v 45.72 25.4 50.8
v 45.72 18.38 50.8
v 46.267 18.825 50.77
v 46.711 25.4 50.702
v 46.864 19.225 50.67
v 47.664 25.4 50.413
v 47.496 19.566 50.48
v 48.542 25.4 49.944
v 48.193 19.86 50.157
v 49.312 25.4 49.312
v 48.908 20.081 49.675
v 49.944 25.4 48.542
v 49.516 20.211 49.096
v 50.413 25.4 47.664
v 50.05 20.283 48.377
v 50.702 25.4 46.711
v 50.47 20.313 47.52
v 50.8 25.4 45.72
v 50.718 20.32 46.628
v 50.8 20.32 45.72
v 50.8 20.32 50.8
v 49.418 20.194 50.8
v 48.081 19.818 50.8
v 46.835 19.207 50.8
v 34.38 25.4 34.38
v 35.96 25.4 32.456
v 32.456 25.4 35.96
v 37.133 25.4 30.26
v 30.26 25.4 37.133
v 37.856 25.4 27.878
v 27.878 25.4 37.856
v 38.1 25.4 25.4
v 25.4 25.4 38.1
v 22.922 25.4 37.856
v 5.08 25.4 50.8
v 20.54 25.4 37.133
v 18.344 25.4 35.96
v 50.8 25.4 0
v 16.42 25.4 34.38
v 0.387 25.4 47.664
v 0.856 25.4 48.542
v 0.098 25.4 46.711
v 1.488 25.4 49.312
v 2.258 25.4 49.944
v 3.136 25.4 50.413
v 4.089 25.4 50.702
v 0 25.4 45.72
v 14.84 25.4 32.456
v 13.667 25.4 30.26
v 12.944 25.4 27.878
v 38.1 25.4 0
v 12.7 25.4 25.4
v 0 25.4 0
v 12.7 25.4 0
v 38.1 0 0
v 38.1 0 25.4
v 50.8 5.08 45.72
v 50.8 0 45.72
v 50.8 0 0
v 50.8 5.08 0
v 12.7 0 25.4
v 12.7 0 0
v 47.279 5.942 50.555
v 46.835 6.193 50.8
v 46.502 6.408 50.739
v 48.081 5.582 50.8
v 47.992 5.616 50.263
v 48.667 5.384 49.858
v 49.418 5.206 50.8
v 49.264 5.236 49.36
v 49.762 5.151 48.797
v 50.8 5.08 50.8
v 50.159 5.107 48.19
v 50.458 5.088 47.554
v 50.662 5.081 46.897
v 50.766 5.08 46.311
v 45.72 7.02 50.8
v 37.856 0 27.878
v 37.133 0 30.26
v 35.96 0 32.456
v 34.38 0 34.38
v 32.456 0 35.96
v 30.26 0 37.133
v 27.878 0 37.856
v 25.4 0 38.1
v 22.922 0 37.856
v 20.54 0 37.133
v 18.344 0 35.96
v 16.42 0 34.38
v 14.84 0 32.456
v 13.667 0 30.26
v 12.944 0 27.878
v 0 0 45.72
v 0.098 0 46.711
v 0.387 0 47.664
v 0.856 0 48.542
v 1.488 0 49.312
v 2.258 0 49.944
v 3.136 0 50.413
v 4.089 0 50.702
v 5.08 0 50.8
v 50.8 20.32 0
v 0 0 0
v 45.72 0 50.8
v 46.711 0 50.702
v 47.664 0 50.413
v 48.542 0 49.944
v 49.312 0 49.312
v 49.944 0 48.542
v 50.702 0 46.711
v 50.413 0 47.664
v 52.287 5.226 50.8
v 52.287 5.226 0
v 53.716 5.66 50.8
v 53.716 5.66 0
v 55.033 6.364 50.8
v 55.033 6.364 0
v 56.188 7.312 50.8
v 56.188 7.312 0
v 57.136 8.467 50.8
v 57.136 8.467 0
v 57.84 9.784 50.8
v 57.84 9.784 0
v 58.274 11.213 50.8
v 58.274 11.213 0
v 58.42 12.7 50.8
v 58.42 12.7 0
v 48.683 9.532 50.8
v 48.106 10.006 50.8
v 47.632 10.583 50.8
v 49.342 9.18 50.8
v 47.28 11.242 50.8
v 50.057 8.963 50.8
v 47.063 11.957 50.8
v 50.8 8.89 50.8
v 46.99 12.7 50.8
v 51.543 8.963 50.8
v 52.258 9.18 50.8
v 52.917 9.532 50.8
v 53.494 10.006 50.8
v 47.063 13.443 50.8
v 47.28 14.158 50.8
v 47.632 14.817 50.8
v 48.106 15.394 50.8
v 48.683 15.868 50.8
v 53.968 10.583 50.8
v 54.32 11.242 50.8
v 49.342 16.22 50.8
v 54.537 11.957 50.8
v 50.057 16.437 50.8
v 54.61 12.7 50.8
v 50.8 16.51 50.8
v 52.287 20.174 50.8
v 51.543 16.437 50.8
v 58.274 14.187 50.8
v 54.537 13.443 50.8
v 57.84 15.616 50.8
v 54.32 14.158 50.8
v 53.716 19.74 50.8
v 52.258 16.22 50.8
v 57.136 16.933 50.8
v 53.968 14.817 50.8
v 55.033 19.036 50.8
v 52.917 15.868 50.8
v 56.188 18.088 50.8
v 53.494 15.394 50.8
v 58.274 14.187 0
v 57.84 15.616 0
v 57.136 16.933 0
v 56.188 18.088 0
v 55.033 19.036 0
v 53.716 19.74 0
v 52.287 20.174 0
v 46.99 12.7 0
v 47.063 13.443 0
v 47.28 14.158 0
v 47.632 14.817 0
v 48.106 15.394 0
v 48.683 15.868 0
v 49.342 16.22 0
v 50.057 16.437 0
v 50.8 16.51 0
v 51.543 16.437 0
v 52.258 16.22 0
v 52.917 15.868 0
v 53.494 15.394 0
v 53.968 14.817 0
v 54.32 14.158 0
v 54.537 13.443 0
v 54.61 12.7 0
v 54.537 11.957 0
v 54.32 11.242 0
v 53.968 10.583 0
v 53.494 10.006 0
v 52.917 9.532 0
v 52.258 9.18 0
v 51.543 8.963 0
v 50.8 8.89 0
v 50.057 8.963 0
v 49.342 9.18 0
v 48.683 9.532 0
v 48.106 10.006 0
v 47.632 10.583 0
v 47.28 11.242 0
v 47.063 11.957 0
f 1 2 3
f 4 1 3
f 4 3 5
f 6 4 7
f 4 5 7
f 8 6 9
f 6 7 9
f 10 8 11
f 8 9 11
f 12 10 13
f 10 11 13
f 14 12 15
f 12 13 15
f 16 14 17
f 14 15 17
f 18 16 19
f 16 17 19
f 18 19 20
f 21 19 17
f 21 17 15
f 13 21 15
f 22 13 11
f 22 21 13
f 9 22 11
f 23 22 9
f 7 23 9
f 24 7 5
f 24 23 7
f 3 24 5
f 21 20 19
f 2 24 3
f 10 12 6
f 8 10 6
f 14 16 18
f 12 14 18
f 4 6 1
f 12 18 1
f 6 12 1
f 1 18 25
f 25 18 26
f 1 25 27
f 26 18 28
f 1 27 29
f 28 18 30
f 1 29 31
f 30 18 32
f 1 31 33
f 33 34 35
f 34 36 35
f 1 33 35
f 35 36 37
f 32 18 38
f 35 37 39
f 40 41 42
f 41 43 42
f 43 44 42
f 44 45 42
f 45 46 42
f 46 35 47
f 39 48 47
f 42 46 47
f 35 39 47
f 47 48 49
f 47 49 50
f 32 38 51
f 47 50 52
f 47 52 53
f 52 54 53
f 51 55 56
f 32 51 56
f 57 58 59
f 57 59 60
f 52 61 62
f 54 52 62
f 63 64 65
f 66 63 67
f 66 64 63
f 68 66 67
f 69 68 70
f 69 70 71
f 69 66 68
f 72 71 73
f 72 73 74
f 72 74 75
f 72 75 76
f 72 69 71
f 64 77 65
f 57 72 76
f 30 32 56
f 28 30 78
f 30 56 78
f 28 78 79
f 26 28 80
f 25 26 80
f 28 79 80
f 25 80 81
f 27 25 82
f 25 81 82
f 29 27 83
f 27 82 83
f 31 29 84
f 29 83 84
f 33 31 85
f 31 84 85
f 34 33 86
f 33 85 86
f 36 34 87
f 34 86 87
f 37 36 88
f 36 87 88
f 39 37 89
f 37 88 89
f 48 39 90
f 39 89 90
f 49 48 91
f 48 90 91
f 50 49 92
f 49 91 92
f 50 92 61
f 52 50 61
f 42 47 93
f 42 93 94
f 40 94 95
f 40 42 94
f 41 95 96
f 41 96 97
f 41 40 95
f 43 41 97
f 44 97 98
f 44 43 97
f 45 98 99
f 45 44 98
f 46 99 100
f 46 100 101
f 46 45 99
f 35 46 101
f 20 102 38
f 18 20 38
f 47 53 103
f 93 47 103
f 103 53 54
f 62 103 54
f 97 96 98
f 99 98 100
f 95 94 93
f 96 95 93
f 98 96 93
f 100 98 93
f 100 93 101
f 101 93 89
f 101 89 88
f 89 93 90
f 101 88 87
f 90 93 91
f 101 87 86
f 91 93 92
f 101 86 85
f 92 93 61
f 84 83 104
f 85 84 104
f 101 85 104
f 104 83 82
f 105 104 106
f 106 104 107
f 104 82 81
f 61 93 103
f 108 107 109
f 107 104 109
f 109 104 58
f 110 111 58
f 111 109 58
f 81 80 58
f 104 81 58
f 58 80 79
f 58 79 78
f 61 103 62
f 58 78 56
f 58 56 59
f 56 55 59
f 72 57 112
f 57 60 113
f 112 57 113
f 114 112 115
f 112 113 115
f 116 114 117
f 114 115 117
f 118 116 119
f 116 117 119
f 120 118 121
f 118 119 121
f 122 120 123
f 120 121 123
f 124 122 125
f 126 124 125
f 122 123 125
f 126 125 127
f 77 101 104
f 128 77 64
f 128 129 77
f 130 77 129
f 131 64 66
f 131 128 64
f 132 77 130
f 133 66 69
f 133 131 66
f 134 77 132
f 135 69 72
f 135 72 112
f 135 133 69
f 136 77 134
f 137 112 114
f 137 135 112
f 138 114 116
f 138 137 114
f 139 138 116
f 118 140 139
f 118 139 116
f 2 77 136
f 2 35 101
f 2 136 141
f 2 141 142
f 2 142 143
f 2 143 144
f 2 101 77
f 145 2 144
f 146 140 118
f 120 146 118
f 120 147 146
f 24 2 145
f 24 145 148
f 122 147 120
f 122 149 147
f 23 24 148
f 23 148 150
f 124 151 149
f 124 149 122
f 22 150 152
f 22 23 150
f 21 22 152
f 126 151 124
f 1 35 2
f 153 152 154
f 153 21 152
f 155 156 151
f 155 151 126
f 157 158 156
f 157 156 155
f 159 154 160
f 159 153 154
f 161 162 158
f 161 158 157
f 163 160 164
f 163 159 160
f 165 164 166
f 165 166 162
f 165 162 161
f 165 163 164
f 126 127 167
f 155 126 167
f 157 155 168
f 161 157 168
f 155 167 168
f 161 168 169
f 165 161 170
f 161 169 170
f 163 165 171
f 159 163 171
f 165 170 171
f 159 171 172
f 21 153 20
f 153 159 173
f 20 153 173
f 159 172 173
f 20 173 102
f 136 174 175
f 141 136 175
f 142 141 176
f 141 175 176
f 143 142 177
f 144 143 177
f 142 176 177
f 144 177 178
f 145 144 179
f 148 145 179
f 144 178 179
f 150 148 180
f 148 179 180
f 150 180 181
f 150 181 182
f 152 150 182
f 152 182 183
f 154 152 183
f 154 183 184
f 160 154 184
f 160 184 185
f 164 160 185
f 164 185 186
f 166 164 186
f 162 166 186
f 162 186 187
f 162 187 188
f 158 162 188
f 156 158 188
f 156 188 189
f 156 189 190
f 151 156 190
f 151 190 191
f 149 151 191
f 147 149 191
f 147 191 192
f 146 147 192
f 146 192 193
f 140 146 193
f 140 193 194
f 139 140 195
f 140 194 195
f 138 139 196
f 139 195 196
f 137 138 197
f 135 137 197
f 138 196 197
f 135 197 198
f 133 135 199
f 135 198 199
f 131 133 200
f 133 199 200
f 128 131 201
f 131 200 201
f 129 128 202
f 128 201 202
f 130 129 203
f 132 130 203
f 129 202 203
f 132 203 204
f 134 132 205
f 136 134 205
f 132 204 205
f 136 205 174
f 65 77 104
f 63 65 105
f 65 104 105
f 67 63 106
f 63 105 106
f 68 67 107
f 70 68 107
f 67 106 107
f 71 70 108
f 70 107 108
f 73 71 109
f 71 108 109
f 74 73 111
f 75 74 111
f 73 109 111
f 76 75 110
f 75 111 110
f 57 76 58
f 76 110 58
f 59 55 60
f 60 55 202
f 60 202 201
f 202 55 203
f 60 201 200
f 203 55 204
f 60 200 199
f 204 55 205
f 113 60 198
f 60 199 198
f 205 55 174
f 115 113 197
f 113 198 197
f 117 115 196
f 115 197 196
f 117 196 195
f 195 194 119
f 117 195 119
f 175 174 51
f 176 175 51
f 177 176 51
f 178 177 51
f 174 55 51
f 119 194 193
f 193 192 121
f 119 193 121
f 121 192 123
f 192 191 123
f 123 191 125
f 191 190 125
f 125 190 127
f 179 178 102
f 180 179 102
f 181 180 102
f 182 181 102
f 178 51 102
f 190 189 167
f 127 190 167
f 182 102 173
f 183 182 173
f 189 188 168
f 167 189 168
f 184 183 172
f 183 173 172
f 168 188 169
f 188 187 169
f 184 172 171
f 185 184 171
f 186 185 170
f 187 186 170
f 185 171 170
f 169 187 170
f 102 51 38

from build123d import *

# Parameters (mm, degrees)
F1_DEPTH     = 50.8
F3_DEPTH     = 25.4
F4_T1_DEPTH  = 50.8
F4_T6_DEPTH  = 30.48
F4_S7_R      = 7.62
F4_T8_DEPTH  = 17
F4_T12_DEPTH = 30.48
F4_S13_R     = 7.62
F4_T14_DEPTH = 17
F6_D         = 7.62


# Not quite as in the source:
# - a fillet or chamfer that OpenCascade refuses, or shapes differently, is made with other operations: its cross-section is extruded or revolved along the edge and cut away or added


with BuildPart() as f1:
    # F0 (on Top) → F1 (new body)
    with BuildSketch(Plane.XY):
        with BuildLine():
            Line((0, 25.4), (0, 0))
            Line((0, 0), (50.8, 0))
            Line((50.8, 0), (50.8, 5.08))
            ThreePointArc((50.8, 5.08), (43.18, 12.7), (50.8, 20.32))
            Line((50.8, 20.32), (50.8, 25.4))
            Line((50.8, 25.4), (0, 25.4))
        make_face()
        with BuildLine():
            Line((50.8, 20.32), (50.8, 5.08))
            ThreePointArc((50.8, 5.08), (56.1881536726, 7.3118463274), (58.42, 12.7))
            ThreePointArc((58.42, 12.7), (56.1881536726, 18.0881536726), (50.8, 20.32))
        make_face()
        with BuildLine():
            ThreePointArc((50.8, 20.32), (43.18, 12.7), (50.8, 5.08))
            Line((50.8, 5.08), (50.8, 20.32))
        make_face()
    extrude(amount=F1_DEPTH)

    # F2 (on face) → F3 (cut)
    with BuildSketch(Plane.XZ):
        with BuildLine():
            ThreePointArc((38.1, 25.4), (25.4, 38.1), (12.7, 25.4))
            Line((12.7, 25.4), (38.1, 25.4))
        make_face()
        with BuildLine():
            Line((38.1, 25.4), (12.7, 25.4))
            ThreePointArc((12.7, 25.4), (25.4, 12.7), (38.1, 25.4))
        make_face()
        with BuildLine():
            Line((12.7, 25.4), (12.7, 0))
            Line((12.7, 0), (38.1, 0))
            Line((38.1, 0), (38.1, 25.4))
            ThreePointArc((38.1, 25.4), (25.4, 12.7), (12.7, 25.4))
        make_face()
    extrude(amount=-F3_DEPTH, mode=Mode.SUBTRACT)

    # F4: fillet of radius 5.08 on 3 edges, made by hand

    # F4_s2 → F4_t1 (cut)
    with BuildSketch(Plane.XZ.offset(-38.1)):
        with BuildLine():
            ThreePointArc((0, 45.72), (1.4878975516, 49.3121024484), (5.08, 50.8))
            Line((5.08, 50.8), (0, 50.8))
            Line((0, 50.8), (0, 45.72))
        make_face()
    extrude(amount=F4_T1_DEPTH, mode=Mode.SUBTRACT)


with BuildPart() as f4_tool4:
    # F4_s5 → F4_t6 (new body)
    with BuildSketch(Plane.XZ.offset(12.7)):
        with BuildLine():
            ThreePointArc((45.72, 50.8), (49.3121024484, 49.3121024484), (50.8, 45.72))
            Line((50.8, 45.72), (50.8, 50.8))
            Line((50.8, 50.8), (45.72, 50.8))
        make_face()
    extrude(amount=-F4_T6_DEPTH)

    # F4_s7 → F4_t8 (cut, symmetric)
    with BuildSketch(Plane.XY.offset(48.3)):
        with Locations((50.8, 12.7)):
            Circle(F4_S7_R)
    extrude(amount=F4_T8_DEPTH, both=True, mode=Mode.SUBTRACT)


with BuildPart() as f1_1:
    add(f1.part)

    # F4_t3: cut F4_tool4
    add(f4_tool4.part, mode=Mode.SUBTRACT)


with BuildPart() as f4_tool10:
    # F4_s11 → F4_t12 (new body)
    with BuildSketch(Plane.XZ.offset(-7.62)):
        with BuildLine():
            ThreePointArc((45.72, 50.8), (49.3121024484, 49.3121024484), (50.8, 45.72))
            Line((50.8, 45.72), (50.8, 50.8))
            Line((50.8, 50.8), (45.72, 50.8))
        make_face()
    extrude(amount=-F4_T12_DEPTH)

    # F4_s13 → F4_t14 (cut, symmetric)
    with BuildSketch(Plane.XY.offset(48.3)):
        with Locations((50.8, 12.7)):
            Circle(F4_S13_R)
    extrude(amount=F4_T14_DEPTH, both=True, mode=Mode.SUBTRACT)


with BuildPart() as f1_2:
    add(f1_1.part)

    # F4_t9: cut F4_tool10
    add(f4_tool10.part, mode=Mode.SUBTRACT)

    # F6 (through all)
    with Locations(Plane.XY.offset(50.8)):
        with Locations((50.8, 12.7)):
            Hole(F6_D / 2)


solid = f1_2.part
